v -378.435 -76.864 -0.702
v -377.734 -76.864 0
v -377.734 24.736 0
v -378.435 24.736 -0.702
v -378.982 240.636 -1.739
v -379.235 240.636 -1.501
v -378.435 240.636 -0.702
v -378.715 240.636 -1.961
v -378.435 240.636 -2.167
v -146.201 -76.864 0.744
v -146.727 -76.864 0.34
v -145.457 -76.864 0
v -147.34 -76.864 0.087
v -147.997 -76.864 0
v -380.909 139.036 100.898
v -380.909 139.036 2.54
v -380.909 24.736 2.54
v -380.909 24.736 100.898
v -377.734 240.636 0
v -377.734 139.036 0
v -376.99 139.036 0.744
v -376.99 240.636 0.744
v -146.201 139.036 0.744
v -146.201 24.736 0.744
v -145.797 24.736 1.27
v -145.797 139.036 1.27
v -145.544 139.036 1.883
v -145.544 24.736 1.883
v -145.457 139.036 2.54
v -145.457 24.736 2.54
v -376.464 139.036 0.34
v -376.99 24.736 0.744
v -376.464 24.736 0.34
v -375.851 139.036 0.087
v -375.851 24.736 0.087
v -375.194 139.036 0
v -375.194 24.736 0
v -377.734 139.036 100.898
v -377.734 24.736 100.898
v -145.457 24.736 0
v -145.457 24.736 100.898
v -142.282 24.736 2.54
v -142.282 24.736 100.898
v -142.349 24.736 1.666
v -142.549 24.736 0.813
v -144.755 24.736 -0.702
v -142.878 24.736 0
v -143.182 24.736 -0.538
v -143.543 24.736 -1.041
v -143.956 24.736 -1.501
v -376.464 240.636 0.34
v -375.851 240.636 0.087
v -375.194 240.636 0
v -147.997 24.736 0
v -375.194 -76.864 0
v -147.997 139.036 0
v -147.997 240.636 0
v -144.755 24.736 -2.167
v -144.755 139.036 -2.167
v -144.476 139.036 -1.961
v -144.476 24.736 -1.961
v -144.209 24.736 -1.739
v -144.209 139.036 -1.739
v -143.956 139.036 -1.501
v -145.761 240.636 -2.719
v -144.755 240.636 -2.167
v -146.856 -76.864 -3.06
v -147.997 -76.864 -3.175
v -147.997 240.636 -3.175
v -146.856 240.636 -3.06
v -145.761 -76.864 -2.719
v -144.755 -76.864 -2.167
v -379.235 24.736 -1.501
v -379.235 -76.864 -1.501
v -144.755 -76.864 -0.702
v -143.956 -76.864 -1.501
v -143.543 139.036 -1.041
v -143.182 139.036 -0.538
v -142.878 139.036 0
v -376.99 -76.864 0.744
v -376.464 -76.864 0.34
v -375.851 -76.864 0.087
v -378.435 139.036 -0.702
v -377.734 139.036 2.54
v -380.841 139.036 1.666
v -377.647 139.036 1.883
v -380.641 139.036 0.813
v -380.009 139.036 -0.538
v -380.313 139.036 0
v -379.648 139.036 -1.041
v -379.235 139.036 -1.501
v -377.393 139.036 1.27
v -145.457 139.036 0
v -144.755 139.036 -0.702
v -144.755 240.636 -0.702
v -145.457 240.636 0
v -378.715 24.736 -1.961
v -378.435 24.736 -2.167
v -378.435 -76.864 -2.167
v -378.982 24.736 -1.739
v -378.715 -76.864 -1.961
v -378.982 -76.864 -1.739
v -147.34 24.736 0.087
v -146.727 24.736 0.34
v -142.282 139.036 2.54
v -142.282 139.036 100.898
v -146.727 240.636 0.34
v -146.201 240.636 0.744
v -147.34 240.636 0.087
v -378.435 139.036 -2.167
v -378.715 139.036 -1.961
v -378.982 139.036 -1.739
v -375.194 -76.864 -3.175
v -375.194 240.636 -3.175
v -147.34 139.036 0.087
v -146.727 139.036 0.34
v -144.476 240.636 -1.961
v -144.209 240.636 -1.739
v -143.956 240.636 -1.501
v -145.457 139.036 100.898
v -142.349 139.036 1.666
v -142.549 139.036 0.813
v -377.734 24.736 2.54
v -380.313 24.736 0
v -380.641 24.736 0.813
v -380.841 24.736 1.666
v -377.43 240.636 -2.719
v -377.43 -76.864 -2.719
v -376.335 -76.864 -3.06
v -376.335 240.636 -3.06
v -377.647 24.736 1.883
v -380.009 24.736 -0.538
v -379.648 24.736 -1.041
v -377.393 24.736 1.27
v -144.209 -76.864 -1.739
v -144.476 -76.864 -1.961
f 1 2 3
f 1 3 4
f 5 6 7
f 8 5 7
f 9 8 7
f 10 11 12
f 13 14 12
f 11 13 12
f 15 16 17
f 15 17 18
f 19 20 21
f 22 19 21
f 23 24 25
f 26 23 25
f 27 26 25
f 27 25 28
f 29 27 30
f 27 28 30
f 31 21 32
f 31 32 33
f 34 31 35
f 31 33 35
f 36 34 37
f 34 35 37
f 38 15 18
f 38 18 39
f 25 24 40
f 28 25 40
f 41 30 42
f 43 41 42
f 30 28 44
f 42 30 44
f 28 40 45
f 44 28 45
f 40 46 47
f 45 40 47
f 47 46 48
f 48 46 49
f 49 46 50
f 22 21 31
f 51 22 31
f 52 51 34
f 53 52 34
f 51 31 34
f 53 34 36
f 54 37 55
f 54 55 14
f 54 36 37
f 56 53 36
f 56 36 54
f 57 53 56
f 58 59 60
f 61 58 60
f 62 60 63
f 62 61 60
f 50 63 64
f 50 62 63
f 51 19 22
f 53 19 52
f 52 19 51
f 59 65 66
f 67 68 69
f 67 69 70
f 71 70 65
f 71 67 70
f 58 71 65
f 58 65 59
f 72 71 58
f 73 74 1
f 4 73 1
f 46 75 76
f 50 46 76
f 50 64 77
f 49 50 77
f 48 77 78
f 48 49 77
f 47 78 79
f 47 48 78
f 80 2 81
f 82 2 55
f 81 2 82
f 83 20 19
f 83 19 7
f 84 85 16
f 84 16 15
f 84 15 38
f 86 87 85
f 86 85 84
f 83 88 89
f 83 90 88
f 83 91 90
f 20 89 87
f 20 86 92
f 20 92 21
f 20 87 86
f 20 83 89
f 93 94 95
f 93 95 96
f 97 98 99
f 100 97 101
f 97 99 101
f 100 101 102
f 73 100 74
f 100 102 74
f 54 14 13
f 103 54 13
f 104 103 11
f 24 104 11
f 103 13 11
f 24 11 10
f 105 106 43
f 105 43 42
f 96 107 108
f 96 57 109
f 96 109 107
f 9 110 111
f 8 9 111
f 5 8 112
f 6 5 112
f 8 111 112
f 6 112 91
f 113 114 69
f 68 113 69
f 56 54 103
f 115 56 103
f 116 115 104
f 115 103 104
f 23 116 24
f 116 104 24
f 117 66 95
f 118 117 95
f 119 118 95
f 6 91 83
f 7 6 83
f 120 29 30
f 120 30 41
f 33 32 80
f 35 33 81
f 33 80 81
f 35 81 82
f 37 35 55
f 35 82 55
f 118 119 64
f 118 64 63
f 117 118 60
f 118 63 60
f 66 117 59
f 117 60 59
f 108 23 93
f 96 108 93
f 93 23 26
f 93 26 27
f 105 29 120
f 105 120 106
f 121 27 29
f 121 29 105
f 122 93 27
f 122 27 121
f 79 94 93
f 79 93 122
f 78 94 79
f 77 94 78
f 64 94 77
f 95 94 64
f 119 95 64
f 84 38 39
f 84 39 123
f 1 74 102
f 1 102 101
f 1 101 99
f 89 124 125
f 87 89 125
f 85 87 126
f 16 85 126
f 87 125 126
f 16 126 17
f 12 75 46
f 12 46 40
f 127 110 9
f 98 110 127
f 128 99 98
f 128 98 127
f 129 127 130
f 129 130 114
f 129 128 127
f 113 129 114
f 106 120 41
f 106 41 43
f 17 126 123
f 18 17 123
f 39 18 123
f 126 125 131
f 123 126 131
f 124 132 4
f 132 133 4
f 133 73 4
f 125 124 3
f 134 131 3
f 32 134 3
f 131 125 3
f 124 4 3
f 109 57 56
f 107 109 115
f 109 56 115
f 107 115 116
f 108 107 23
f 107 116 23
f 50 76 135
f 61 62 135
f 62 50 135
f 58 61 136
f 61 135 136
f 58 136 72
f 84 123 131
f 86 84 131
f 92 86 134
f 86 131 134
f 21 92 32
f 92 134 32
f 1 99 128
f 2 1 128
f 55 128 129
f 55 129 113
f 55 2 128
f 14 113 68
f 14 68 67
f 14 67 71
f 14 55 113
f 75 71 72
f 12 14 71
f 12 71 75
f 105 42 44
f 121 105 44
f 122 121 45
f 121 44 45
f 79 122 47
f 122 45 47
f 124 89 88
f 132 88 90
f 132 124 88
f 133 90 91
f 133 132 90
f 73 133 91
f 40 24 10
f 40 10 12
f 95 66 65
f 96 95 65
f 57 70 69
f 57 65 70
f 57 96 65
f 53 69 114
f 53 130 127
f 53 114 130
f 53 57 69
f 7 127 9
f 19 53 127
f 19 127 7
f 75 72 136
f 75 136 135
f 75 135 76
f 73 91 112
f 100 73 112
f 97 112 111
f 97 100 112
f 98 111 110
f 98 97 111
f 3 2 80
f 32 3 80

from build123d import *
from build123d.topology import SkipClean

# Parameters (mm, degrees)
BASE_FLANGE1_DEPTH     = 3.175
SKETCHED_START         = -76.863629597
SKETCHED_BEND1_DEPTH   = 317.5
SKETCHED_BEND1_2_DEPTH = 101.6
SKETCHED_START_2       = 139.036370403
SKETCHED_BEND1_3_DEPTH = 101.6
SKETCHED_START_3       = 24.736370403
SKETCHED_BEND1_4_DEPTH = 114.3
SKETCHED_BEND1_5_DEPTH = 317.5


# Read off the part's stored shape, not the designer's step: Sketched Bend1
# Sheet-metal steps are written as plain solids
with BuildPart() as part:
    # Sketch1 → Base-Flange1 (new body)
    with BuildSketch(Plane.XY):
        Polygon((-43.155335008, 139.036370403), (-144.755335008, 139.036370403), (-144.755335008, 240.636370403), (-378.435335008, 240.636370403), (-378.435335008, 139.036370403), (-480.035335008, 139.036370403), (-480.035335008, 24.736370403), (-378.435335008, 24.736370403), (-378.435335008, -76.863629597), (-144.755335008, -76.863629597), (-144.755335008, 24.736370403), (-43.155335008, 24.736370403), align=None)
    extrude(amount=-BASE_FLANGE1_DEPTH)

    # Sketched Bend1 outline → Sketched Bend1 (cut)
    with BuildSketch(Plane(origin=(0, 0, 0), x_dir=(1, 0, 0), z_dir=(0, 1, 0)).offset(SKETCHED_START)):
        with BuildLine():
            ThreePointArc((-380.313137759, 0), (-378.20567356, 2.316816086), (-375.193604089, 3.175))
            Line((-375.193604089, 3.175), (-480.035335008, 3.175))
            Line((-480.035335008, 3.175), (-480.035335008, 0))
            Line((-480.035335008, 0), (-380.313137759, 0))
        make_face()
        with BuildLine():
            ThreePointArc((-147.997065928, 3.175), (-144.984996457, 2.316816087), (-142.877532258, 0))
            Line((-142.877532258, 0), (-43.155335008, 0))
            Line((-43.155335008, 0), (-43.155335008, 3.175))
            Line((-43.155335008, 3.175), (-147.997065928, 3.175))
        make_face()
    extrude(amount=SKETCHED_BEND1_DEPTH, mode=Mode.SUBTRACT)

    # Sketched Bend1 2 outline → Sketched Bend1 2 (cut)
    with BuildSketch(Plane(origin=(0, 0, 0), x_dir=(1, 0, 0), z_dir=(0, 1, 0)).offset(SKETCHED_START)):
        Polygon((-377.733604089, 0), (-378.435335008, 0.701730919), (-378.435335008, 0), align=None)
        Polygon((-144.755335008, 0.701730919), (-145.457065927, 0), (-144.755335008, 0), align=None)
    extrude(amount=SKETCHED_BEND1_2_DEPTH, mode=Mode.SUBTRACT)

    # Sketched Bend1 3 outline → Sketched Bend1 3 (cut)
    with BuildSketch(Plane(origin=(0, 0, 0), x_dir=(1, 0, 0), z_dir=(0, 1, 0)).offset(SKETCHED_START_2)):
        Polygon((-377.733604089, 0), (-378.435335008, 0.701730919), (-378.435335008, 0), align=None)
        Polygon((-144.755335008, 0.701730919), (-145.457065927, 0), (-144.755335008, 0), align=None)
    extrude(amount=SKETCHED_BEND1_3_DEPTH, mode=Mode.SUBTRACT)

    # Sketched Bend1 4 outline → Sketched Bend1 4 (add)
    with BuildSketch(Plane(origin=(0, 0, 0), x_dir=(1, 0, 0), z_dir=(0, 1, 0)).offset(SKETCHED_START_3)):
        with BuildLine():
            ThreePointArc((-380.313137759, 0), (-380.757746427, -1.235567159), (-380.908604089, -2.54))
            Line((-380.908604089, -2.54), (-380.908604089, -100.898269081))
            Line((-380.908604089, -100.898269081), (-377.733604089, -100.898269081))
            Line((-377.733604089, -100.898269081), (-377.733604089, -2.54))
            ThreePointArc((-377.733604089, -2.54), (-376.989655313, -0.743948776), (-375.193604089, 0))
            Line((-375.193604089, 0), (-380.313137759, 0))
        make_face()
        with BuildLine():
            ThreePointArc((-147.997065928, 0), (-146.201014704, -0.743948775), (-145.457065928, -2.54))
            Line((-145.457065928, -2.54), (-145.457065928, -100.898269081))
            Line((-145.457065928, -100.898269081), (-142.282065928, -100.898269081))
            Line((-142.282065928, -100.898269081), (-142.282065928, -2.54))
            ThreePointArc((-142.282065928, -2.54), (-142.43292359, -1.235567159), (-142.877532258, 0))
            Line((-142.877532258, 0), (-147.997065928, 0))
        make_face()
    extrude(amount=SKETCHED_BEND1_4_DEPTH)

    # Sketched Bend1 5 outline → Sketched Bend1 5 (add)
    with SkipClean():  # the faces are left unmerged after this step: merging them gives an invalid solid
        with BuildSketch(Plane(origin=(0, 0, 0), x_dir=(1, 0, 0), z_dir=(0, 1, 0)).offset(SKETCHED_START)):
            with BuildLine():
                ThreePointArc((-378.435335008, 2.166634216), (-378.850199632, 1.852099045), (-379.234719343, 1.501115254))
                Line((-379.234719343, 1.501115254), (-378.435335008, 0.701730919))
                Line((-378.435335008, 0.701730919), (-378.435335008, 2.166634216))
            make_face()
            with BuildLine():
                Line((-375.193604089, 0), (-377.733604089, 0))
                Line((-377.733604089, 0), (-376.989655313, -0.743948776))
                ThreePointArc((-376.989655313, -0.743948776), (-376.165620007, -0.193345988), (-375.193604089, 0))
            make_face()
            with BuildLine():
                Line((-145.457065927, 0), (-147.997065928, 0))
                ThreePointArc((-147.997065928, 0), (-147.025050009, -0.193345987), (-146.201014703, -0.743948776))
                Line((-146.201014703, -0.743948776), (-145.457065927, 0))
            make_face()
            with BuildLine():
                ThreePointArc((-143.955950673, 1.501115254), (-144.340470384, 1.852099046), (-144.755335008, 2.166634216))
                Line((-144.755335008, 2.166634216), (-144.755335008, 0.701730919))
                Line((-144.755335008, 0.701730919), (-143.955950673, 1.501115254))
            make_face()
        extrude(amount=SKETCHED_BEND1_5_DEPTH)


solid = part.part
